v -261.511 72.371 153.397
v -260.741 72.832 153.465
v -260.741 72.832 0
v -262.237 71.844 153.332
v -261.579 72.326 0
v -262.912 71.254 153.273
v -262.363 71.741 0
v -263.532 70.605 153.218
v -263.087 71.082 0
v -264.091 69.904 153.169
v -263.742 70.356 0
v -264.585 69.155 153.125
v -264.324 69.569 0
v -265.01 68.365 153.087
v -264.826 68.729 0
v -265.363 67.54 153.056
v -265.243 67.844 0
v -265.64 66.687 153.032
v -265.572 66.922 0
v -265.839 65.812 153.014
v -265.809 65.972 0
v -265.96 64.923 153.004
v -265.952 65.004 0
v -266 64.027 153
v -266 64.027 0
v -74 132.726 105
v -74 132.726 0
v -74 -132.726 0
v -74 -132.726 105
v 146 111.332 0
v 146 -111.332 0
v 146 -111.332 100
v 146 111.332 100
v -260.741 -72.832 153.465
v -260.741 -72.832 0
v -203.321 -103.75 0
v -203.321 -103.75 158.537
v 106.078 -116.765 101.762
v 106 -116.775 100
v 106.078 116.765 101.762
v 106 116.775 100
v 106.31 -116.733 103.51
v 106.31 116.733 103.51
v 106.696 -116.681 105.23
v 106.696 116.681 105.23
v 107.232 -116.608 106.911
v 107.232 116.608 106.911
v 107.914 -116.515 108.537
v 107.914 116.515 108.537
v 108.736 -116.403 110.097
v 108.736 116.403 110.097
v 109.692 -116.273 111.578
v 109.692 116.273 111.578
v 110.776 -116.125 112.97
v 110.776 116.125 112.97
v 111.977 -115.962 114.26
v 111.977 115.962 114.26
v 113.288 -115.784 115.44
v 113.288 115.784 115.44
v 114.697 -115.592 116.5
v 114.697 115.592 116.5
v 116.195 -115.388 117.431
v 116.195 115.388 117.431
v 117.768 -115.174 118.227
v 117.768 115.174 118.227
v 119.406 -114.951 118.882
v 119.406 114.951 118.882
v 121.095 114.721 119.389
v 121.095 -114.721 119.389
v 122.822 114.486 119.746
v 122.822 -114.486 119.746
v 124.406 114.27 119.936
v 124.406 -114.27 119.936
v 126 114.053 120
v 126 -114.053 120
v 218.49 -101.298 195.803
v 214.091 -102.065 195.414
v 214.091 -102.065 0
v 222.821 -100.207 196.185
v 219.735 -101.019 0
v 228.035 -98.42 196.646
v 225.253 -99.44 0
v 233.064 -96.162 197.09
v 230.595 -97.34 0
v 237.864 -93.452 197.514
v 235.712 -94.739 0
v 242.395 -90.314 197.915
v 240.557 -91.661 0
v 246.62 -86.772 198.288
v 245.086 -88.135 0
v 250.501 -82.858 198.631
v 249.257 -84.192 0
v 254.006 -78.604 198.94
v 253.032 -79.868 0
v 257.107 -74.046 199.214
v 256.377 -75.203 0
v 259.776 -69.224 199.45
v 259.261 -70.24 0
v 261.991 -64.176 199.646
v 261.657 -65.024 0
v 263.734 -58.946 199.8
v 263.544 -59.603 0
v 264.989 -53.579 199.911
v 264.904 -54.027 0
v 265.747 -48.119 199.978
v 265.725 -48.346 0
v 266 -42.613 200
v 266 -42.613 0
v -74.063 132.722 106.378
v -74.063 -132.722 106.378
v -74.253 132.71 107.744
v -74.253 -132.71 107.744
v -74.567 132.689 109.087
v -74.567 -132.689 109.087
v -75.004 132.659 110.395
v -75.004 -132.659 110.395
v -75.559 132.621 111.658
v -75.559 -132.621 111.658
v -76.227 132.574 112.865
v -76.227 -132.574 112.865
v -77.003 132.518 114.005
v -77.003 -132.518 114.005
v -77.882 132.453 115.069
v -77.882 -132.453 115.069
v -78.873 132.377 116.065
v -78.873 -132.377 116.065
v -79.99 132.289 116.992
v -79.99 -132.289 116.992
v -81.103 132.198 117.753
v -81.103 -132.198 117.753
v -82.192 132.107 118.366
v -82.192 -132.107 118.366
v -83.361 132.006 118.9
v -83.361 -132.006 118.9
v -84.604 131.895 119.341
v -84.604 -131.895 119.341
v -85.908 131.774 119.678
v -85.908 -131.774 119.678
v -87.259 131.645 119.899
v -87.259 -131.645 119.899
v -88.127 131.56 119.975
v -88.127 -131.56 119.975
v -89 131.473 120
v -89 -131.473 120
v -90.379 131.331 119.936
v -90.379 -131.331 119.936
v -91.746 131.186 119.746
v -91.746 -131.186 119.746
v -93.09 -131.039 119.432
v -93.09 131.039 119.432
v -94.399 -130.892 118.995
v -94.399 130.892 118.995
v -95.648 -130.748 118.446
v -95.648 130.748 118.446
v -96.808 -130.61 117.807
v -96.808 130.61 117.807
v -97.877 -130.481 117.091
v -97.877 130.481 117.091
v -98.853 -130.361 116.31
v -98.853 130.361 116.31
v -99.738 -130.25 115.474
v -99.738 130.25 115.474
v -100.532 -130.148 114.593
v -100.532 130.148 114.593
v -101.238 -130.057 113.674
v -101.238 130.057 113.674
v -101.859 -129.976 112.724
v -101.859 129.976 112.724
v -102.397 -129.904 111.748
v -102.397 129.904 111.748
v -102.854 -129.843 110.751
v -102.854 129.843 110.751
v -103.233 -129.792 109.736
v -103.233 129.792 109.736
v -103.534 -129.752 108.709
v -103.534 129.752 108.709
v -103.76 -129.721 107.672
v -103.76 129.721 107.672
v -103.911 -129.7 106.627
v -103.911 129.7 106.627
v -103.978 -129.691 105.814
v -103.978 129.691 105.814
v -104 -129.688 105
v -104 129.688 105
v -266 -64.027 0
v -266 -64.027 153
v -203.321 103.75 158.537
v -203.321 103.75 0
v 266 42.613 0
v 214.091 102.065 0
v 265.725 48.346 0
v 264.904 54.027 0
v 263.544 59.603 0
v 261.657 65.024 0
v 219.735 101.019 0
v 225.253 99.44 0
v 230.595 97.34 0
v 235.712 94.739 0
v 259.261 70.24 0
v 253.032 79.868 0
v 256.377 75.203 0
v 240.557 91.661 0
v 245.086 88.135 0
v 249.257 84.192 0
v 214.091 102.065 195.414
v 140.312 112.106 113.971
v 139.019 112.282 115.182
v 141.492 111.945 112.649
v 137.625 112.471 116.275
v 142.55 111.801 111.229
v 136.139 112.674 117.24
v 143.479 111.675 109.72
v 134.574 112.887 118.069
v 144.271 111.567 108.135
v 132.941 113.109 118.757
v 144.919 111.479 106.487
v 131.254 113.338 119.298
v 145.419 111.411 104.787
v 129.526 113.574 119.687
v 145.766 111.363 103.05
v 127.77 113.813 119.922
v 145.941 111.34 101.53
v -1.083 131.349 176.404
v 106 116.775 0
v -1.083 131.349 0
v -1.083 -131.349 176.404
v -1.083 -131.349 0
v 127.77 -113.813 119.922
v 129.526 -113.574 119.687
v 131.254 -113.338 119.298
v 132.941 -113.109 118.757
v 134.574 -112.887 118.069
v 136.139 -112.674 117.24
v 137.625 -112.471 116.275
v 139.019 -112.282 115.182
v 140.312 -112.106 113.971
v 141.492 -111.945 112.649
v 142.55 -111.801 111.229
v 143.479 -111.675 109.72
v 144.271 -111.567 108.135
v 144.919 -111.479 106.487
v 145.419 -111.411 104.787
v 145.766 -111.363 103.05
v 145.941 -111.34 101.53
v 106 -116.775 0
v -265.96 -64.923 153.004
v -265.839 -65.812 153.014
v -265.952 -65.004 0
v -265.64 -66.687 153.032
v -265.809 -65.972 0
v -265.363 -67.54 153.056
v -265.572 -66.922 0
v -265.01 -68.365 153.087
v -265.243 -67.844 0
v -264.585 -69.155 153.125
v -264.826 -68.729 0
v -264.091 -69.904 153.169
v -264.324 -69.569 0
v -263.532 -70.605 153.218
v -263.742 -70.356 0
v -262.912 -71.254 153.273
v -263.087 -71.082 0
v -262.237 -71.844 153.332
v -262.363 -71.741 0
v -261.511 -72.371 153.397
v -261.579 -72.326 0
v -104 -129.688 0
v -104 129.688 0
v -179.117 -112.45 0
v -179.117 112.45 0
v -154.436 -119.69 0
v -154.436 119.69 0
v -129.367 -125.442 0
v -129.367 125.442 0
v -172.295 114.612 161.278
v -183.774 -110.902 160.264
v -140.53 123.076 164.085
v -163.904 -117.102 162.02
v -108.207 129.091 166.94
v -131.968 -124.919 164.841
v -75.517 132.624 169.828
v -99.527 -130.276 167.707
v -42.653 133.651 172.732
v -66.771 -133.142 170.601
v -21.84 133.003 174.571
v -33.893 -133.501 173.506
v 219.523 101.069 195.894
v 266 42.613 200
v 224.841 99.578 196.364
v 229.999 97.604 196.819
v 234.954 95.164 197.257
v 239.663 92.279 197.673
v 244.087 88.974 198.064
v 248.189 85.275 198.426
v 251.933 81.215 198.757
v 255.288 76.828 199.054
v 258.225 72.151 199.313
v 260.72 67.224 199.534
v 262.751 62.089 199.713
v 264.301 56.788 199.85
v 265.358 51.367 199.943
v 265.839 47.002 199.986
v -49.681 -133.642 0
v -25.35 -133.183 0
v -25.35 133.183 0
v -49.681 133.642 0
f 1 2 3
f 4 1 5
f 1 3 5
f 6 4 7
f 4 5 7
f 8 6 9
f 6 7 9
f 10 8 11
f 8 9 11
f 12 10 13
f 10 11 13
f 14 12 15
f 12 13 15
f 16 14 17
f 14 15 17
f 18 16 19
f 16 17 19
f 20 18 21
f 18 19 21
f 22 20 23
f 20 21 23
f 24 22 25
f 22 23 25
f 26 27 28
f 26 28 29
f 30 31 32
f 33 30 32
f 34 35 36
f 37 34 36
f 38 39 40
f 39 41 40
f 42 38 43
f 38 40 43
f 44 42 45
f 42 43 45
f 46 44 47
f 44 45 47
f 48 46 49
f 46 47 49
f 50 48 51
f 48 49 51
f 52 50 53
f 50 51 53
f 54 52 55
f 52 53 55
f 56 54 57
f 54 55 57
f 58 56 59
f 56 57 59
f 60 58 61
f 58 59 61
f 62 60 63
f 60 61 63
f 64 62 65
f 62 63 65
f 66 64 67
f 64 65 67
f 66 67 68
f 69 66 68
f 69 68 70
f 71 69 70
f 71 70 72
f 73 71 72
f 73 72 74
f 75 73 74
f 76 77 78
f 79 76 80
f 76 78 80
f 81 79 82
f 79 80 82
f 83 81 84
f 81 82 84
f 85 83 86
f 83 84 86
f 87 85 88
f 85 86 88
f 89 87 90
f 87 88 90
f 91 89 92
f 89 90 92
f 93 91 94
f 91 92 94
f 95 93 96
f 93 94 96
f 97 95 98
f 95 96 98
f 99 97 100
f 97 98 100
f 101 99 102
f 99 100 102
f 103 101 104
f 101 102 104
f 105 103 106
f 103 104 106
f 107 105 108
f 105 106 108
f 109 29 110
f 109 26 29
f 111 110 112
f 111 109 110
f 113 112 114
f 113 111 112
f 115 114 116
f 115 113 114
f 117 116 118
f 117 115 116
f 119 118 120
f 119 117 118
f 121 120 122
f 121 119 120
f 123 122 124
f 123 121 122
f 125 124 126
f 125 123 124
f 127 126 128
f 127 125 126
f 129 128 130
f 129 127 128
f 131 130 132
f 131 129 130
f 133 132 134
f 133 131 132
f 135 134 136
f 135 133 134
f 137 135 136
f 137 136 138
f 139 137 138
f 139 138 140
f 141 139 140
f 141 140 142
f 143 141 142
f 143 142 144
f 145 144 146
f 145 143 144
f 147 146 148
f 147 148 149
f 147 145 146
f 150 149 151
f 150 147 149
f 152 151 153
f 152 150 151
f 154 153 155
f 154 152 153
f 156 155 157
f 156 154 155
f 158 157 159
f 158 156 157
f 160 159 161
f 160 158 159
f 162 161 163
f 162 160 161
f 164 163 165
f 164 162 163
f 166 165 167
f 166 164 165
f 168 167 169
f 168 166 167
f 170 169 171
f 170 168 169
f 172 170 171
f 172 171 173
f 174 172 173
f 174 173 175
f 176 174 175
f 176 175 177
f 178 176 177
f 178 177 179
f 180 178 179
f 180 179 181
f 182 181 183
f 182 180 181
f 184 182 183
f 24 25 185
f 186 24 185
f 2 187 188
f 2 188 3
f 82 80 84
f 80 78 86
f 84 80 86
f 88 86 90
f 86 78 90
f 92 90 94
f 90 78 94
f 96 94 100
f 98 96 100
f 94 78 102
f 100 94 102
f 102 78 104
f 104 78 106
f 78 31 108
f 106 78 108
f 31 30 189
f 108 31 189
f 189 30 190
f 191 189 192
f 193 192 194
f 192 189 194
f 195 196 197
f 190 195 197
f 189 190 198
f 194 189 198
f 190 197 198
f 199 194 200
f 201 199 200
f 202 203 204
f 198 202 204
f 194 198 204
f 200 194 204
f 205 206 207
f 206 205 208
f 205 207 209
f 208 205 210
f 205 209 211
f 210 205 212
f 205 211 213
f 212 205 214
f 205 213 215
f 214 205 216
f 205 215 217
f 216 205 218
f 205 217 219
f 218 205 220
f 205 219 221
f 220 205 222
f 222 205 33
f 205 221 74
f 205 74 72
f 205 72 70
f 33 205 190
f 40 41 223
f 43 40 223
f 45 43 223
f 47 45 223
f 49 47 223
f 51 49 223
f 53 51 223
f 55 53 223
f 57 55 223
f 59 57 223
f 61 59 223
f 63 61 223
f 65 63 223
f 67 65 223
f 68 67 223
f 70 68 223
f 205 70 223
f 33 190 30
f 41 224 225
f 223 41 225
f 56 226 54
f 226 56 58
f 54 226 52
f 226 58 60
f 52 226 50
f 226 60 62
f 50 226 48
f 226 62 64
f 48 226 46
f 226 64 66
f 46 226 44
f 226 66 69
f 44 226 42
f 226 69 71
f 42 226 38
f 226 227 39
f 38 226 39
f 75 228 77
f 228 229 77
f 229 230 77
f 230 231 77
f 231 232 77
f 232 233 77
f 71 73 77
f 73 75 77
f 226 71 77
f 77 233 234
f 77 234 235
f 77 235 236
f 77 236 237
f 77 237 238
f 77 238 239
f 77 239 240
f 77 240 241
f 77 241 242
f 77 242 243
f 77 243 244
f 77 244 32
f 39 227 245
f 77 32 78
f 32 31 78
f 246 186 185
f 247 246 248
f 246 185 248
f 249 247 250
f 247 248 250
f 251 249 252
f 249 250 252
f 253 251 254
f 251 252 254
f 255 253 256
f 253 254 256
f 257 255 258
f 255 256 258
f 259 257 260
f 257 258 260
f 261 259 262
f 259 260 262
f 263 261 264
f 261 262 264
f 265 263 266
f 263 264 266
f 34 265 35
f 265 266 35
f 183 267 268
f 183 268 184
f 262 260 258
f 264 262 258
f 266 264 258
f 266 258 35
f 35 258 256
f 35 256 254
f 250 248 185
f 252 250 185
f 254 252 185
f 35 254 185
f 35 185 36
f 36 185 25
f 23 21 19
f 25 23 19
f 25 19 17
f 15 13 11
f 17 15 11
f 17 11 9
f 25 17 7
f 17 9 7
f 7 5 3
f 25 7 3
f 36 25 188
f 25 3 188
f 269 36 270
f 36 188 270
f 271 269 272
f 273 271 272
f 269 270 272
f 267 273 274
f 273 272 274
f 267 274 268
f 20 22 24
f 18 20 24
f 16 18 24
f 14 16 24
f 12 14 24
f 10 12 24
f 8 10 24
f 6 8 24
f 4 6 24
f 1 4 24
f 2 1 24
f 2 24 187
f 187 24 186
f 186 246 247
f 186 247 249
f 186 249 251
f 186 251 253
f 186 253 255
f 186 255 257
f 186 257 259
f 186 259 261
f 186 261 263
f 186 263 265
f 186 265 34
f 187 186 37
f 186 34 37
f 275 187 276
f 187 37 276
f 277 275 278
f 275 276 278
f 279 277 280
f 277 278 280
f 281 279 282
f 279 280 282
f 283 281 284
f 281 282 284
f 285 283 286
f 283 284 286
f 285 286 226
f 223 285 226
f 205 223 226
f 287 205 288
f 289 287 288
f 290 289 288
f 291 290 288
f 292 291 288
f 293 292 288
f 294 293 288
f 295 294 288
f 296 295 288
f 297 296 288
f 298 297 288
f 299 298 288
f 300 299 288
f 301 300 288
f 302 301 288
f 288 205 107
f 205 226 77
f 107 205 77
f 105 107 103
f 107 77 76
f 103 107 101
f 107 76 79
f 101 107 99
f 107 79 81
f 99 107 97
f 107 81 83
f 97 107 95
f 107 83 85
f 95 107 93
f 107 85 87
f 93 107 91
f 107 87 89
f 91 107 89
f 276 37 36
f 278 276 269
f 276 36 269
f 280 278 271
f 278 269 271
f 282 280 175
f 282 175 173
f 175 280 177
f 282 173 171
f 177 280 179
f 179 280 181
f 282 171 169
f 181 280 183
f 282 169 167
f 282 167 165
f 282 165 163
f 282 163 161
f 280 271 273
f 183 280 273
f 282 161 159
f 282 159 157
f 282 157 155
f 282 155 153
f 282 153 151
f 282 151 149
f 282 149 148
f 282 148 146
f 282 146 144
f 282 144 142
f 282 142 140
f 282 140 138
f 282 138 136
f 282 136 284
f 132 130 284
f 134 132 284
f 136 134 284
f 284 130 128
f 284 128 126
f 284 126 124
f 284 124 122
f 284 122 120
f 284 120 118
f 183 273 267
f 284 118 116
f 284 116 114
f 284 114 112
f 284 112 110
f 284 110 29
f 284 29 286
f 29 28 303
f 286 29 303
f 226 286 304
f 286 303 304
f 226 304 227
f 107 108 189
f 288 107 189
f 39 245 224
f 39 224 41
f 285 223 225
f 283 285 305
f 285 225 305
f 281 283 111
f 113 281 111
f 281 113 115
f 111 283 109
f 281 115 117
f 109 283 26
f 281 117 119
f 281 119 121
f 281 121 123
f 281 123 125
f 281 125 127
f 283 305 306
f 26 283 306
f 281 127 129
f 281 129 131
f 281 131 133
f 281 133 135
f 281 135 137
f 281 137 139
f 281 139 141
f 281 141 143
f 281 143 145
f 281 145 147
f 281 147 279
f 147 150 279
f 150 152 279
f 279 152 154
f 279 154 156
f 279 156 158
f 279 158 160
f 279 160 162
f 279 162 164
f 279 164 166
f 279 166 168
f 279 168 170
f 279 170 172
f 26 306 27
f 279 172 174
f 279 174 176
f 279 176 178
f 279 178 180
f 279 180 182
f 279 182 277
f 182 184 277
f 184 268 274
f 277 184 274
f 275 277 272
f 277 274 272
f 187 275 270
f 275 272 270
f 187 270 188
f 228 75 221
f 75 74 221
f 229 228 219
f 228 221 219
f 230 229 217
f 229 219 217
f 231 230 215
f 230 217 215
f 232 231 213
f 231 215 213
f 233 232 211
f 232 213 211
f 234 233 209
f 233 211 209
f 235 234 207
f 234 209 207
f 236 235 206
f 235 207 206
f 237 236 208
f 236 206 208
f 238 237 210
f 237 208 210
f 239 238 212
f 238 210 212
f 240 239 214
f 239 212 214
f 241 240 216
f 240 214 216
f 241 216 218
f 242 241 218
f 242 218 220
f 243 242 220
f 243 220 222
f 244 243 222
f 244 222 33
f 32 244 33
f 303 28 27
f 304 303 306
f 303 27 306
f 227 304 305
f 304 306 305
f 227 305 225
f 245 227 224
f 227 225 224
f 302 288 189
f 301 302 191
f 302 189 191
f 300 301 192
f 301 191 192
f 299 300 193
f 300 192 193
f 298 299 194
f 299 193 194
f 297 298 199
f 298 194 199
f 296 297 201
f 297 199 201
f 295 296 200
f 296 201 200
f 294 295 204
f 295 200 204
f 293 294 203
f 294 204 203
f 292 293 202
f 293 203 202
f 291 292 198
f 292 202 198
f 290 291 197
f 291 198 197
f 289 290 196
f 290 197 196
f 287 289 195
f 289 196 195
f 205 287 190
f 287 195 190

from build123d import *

# Parameters (mm, degrees)
F1_DEPTH = 200
F3_DEPTH = 150
F4_W     = 40
F4_H     = 120
F4_W_2   = 30
F5_DEPTH = 150
F6_R     = 19.99999
F7_R     = 15
F7_R_2   = 14.99999


# Not quite as in the source:
# - a fillet or chamfer is up to 0.001 mm smaller than in the source, because OpenCascade refuses the exact size
# - ends of sketch curves that miss each other by under 0.0002 mm in the source are joined


with BuildPart() as f1:
    # F0 (on Top) → F1 (new body)
    with BuildSketch(Plane.XY):
        with BuildLine():
            Line((-203.32088, 103.750296), (-260.740998, 72.83177))
            ThreePointArc((-260.740998, 72.83177), (-264.5851610502, 69.1549250028), (-266, 64.027059))
            Line((-266, 64.027059), (-266, -64.027059))
            ThreePointArc((-266, -64.027059), (-264.5851610502, -69.1549250028), (-260.7409980515, -72.8317700956))
            Line((-260.7409980515, -72.8317700956), (-203.32088, -103.750296))
            ThreePointArc((-203.32088, -103.750296), (-103.8608632236, -129.7071209998), (-1.082674041, -131.348924606))
            Line((-1.082674041, -131.348924606), (214.09118, -102.064591))
            ThreePointArc((214.09118, -102.064591), (251.1966304028, -82.0748460353), (266, -42.612654))
            Line((266, -42.612654), (266, 42.612654))
            ThreePointArc((266, 42.612654), (251.1966304028, 82.0748460353), (214.0911799923, 102.0645909435))
            Line((214.0911799923, 102.0645909435), (-1.082674, 131.348925))
            ThreePointArc((-1.082674, 131.348925), (-103.8608632236, 129.7071209998), (-203.32088, 103.750296))
        make_face()
    extrude(amount=F1_DEPTH)

    # F2 (on Front) → F3 (cut, symmetric)
    with BuildSketch(Plane.XZ):
        Polygon((266, 200), (-266, 200), (-266, 153), align=None)
    extrude(amount=F3_DEPTH, both=True, mode=Mode.SUBTRACT)

    # F4 (on Front) → F5 (cut, symmetric)
    with BuildSketch(Plane.XZ):
        with Locations((126, 60)):
            Rectangle(F4_W, F4_H)
        with Locations((-89, 60)):
            Rectangle(F4_W_2, F4_H)
    extrude(amount=F5_DEPTH, both=True, mode=Mode.SUBTRACT)

    # F6 (radius 20 in the source; OpenCascade refuses exactly that, so slightly less here)
    f6_edges = [f1.edges().sort_by_distance(p)[0] for p in [
        (146, 0, 120),
        (106, 0, 120),
    ]]
    fillet(f6_edges, radius=F6_R)

    # F7 (call 1 of 2: OpenCascade refuses the feature's edges together)
    f7_edges = [f1.edges().sort_by_distance(p)[0] for p in [
        (-74, 0, 120),
    ]]
    fillet(f7_edges, radius=F7_R)

    # F7#2 (call 2 of 2) (radius 15 in the source; OpenCascade refuses exactly that, so slightly less here)
    f7_2_edges = [f1.edges().sort_by_distance(p)[0] for p in [
        (-104, 0, 120),
    ]]
    fillet(f7_2_edges, radius=F7_R_2)


solid = f1.part
